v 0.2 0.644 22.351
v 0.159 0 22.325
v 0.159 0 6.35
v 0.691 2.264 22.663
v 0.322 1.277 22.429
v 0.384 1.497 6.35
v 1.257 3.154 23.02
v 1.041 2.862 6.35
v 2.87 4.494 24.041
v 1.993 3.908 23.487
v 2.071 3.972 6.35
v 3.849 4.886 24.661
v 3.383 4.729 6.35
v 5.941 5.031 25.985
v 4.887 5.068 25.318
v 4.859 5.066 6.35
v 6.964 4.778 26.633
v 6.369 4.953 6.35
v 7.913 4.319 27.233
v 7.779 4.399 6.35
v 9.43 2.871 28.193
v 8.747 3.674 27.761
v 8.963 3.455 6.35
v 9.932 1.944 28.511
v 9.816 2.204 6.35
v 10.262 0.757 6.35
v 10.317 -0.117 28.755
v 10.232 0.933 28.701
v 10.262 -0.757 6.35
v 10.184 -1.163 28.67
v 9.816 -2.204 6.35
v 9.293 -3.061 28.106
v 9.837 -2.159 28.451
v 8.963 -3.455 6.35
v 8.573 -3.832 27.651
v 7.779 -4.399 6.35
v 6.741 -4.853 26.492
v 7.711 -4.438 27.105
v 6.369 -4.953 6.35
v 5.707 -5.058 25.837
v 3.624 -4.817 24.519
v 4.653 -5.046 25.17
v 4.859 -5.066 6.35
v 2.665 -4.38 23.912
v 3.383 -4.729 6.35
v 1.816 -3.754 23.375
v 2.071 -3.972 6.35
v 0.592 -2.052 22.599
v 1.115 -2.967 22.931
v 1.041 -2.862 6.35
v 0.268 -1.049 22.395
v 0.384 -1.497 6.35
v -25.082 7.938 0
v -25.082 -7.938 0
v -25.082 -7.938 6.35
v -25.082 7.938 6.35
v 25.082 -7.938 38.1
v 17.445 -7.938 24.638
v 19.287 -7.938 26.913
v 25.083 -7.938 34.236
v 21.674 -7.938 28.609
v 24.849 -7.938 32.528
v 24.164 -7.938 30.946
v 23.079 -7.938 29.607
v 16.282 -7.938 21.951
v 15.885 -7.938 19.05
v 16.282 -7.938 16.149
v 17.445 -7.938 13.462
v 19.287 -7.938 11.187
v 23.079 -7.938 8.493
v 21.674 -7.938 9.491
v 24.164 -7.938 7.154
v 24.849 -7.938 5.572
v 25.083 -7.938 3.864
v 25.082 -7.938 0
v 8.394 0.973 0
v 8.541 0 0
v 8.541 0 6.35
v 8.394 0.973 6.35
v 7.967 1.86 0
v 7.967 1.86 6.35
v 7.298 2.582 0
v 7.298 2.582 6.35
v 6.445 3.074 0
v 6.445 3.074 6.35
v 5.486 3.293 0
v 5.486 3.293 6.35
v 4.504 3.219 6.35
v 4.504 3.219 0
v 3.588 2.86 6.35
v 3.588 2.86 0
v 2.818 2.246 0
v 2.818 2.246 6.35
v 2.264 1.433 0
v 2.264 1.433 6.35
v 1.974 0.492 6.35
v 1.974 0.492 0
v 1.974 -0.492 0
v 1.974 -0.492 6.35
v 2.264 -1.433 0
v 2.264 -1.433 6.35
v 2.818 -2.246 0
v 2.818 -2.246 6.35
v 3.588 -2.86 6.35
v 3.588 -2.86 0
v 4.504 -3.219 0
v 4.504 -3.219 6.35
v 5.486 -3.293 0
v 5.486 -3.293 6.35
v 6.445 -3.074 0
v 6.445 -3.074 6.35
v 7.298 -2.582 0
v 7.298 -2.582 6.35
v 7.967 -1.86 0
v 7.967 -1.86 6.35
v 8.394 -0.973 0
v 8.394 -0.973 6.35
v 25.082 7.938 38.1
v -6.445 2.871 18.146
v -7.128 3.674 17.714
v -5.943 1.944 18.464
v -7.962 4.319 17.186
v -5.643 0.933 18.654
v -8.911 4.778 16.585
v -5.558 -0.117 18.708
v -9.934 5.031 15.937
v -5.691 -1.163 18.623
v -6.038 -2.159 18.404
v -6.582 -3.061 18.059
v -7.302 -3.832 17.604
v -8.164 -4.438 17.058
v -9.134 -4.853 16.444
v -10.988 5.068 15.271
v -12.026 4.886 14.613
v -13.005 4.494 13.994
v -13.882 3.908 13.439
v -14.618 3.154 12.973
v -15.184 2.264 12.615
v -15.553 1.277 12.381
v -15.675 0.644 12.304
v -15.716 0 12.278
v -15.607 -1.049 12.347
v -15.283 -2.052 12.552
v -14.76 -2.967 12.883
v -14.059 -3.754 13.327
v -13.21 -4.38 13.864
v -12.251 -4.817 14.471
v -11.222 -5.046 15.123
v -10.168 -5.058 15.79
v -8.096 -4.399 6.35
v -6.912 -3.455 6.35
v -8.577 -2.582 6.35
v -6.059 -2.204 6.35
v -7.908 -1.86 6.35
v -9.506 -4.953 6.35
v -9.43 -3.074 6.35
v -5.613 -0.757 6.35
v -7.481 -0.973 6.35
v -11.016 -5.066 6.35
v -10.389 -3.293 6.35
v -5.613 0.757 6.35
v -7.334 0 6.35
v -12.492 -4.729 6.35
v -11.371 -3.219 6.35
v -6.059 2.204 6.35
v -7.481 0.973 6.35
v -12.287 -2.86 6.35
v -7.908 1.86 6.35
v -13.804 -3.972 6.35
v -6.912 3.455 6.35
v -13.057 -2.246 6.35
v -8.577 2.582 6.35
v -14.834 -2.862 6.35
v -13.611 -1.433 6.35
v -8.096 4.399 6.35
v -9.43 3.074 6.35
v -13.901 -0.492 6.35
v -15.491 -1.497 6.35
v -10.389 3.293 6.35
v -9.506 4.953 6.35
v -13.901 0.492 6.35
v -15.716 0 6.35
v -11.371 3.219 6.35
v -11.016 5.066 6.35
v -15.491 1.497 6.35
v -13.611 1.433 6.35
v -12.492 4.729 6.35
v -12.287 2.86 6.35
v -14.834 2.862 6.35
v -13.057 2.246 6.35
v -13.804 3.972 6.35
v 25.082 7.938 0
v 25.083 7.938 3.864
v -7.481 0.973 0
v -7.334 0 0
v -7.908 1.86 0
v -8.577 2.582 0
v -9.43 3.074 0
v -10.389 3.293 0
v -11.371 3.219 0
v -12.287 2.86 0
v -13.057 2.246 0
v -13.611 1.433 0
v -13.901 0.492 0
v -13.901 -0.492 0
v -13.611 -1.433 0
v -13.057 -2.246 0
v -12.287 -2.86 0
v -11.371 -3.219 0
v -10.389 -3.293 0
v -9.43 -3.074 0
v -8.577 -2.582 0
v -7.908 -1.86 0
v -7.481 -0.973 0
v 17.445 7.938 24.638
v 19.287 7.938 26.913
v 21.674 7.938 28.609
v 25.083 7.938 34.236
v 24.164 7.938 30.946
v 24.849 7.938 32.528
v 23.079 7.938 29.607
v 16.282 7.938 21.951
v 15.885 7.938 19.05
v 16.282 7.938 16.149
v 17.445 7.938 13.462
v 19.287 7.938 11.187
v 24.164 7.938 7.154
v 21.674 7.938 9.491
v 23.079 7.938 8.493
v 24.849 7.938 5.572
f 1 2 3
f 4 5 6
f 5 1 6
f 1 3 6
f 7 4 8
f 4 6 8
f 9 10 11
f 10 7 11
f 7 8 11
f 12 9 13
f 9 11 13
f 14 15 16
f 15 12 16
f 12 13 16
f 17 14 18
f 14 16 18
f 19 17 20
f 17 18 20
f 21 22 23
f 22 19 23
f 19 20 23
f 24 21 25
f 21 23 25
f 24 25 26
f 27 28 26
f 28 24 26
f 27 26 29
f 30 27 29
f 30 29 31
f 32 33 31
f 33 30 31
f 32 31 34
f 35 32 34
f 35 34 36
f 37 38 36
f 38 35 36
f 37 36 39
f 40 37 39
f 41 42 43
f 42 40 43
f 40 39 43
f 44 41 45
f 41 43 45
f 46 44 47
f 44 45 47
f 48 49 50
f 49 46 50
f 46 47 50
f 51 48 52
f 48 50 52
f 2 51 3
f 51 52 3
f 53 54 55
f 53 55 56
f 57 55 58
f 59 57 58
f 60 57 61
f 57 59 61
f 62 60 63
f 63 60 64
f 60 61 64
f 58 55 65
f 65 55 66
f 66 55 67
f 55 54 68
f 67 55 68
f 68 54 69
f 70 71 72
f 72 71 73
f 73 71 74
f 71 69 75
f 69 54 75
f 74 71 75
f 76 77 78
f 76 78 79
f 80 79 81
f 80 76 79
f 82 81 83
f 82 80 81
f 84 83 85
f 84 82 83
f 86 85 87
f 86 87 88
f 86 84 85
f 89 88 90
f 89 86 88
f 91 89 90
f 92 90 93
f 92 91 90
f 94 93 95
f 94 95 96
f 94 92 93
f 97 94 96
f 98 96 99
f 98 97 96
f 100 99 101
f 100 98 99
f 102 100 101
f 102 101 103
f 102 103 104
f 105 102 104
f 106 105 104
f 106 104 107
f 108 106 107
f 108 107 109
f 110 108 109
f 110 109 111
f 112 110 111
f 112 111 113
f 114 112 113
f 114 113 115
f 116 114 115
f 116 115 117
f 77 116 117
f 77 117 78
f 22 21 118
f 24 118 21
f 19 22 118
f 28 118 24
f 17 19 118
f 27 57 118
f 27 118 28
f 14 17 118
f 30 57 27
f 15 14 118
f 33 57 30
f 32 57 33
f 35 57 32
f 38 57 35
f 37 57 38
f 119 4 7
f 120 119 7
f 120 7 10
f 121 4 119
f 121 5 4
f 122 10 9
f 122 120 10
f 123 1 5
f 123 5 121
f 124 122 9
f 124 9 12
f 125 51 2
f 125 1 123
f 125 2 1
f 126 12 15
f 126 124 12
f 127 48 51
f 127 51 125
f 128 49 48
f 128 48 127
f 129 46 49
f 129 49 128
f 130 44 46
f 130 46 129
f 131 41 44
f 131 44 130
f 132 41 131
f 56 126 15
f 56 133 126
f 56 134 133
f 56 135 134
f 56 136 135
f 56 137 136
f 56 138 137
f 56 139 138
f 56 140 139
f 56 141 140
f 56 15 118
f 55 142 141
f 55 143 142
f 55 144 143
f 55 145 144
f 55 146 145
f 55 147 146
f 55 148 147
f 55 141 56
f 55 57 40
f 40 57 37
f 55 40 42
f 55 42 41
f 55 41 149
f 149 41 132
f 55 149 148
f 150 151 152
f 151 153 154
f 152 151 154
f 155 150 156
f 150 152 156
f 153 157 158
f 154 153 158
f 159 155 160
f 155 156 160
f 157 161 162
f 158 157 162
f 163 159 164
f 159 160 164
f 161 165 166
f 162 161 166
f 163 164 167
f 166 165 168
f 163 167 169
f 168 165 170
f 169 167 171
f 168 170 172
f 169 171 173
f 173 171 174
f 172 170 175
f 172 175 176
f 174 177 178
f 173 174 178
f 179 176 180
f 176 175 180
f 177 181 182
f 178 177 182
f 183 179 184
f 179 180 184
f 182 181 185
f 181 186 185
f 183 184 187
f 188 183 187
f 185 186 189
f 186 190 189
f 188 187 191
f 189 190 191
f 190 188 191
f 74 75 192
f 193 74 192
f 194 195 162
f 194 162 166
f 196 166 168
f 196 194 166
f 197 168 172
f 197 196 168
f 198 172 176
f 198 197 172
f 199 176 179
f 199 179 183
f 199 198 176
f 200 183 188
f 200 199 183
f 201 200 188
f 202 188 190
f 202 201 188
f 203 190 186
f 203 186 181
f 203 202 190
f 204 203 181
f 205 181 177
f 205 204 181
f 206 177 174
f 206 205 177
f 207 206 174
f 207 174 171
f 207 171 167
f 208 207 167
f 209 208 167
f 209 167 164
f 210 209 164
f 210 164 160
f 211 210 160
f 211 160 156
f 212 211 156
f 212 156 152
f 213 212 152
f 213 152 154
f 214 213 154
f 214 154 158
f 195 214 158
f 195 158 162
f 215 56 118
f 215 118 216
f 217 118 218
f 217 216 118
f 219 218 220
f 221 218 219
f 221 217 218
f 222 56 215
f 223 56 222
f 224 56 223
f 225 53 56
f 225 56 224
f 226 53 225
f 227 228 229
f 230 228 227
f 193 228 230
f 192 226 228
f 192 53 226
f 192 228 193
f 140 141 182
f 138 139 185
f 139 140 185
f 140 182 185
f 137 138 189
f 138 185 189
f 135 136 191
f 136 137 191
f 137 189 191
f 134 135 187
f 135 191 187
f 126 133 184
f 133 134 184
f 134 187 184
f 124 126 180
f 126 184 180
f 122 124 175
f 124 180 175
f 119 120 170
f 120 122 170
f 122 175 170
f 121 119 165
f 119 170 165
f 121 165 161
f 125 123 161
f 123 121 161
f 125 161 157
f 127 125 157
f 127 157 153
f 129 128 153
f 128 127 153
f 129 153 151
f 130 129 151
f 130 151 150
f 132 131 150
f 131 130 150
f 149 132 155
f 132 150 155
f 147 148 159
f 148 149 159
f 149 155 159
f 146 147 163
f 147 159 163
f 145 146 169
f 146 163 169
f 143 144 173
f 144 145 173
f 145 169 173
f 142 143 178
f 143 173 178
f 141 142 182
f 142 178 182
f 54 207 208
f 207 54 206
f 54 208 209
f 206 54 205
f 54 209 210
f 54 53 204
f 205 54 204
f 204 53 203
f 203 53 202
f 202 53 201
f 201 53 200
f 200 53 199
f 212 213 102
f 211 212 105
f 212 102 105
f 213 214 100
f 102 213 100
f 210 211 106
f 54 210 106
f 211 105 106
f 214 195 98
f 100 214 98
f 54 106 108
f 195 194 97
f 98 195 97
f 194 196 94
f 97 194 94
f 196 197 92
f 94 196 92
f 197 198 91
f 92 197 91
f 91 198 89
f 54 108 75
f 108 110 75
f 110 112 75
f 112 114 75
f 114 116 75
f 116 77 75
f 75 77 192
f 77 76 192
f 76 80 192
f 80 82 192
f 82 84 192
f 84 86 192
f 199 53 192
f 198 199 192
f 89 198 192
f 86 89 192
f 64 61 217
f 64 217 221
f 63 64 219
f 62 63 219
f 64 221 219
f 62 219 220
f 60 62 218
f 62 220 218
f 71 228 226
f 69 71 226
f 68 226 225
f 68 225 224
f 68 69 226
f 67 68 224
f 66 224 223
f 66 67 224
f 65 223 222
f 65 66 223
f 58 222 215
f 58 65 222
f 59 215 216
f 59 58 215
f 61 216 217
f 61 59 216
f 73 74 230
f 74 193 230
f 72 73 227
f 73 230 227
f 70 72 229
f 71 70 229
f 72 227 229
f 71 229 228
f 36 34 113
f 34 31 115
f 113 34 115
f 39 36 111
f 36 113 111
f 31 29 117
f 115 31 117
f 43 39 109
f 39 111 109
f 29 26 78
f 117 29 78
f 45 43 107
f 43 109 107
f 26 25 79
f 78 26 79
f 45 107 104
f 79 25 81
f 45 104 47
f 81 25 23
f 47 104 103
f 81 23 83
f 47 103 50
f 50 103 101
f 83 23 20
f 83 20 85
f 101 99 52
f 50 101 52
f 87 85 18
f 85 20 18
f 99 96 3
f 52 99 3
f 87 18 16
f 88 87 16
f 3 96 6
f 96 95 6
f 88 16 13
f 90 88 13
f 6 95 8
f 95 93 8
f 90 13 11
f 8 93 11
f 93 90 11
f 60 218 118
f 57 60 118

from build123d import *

# Parameters (mm, degrees)
SKETCH1_W           = 50.165
SKETCH1_H           = 15.875
SKETCH1_R           = 3.302
BOSS_EXTRUDE1_DEPTH = 6.35
BOSS_EXTRUDE2_DEPTH = 15.875
FILLET1_R           = 6.35
SKETCH1_3_R         = 3.302
CUT_EXTRUDE1_DEPTH  = 47.300601643
SKETCH10_R          = 5.08
CUT_EXTRUDE4_DEPTH  = 42.233459866


with BuildPart() as part:
    # Sketch1 → Boss-Extrude1 (new body)
    with BuildSketch(Plane.XY):
        Rectangle(SKETCH1_W, SKETCH1_H)
        with Locations((5.23875, 0)):
            Circle(SKETCH1_R, mode=Mode.SUBTRACT)
        with Locations((-10.63625, 0)):
            Circle(SKETCH1_R, mode=Mode.SUBTRACT)
    extrude(amount=BOSS_EXTRUDE1_DEPTH)

    # Sketch4 → Boss-Extrude2 (add, through all)
    with BuildSketch(Plane.XZ.offset(7.9375)):
        with BuildLine():
            Line((-25.0825, 6.35), (25.0825, 6.35))
            Line((25.0825, 6.35), (25.0825, 8.382))
            ThreePointArc((25.0825, 8.382), (15.884529206, 19.05), (25.0825, 29.718))
            Line((25.0825, 29.718), (25.0825, 38.1))
            Line((25.0825, 38.1), (-25.0825, 6.35))
        make_face()
    extrude(amount=-BOSS_EXTRUDE2_DEPTH)

    # Fillet1
    fillet1_edges = [part.edges().sort_by_distance(p)[0] for p in [
        (25.0825, 0, 8.382),
        (25.0825, 0, 29.718),
    ]]
    fillet(fillet1_edges, radius=FILLET1_R)

    # Sketch1<3> → Cut-Extrude1 (cut, through all)
    with BuildSketch(Plane.XY):
        with Locations(Location((5.23875, 0, 0), (0, 0, 180))):
            Circle(SKETCH1_3_R)
        with Locations(Location((-10.63625, 0, 0), (0, 0, 180))):
            Circle(SKETCH1_3_R)
    extrude(amount=CUT_EXTRUDE1_DEPTH, mode=Mode.SUBTRACT)

    # Sketch10 → Cut-Extrude4 (cut, through all)
    with BuildSketch(Plane(origin=(0, 0, 6.35), x_dir=(-1, 0, 0), z_dir=(0, 0, -1))):
        with Locations((10.63625, 0)):
            Circle(SKETCH10_R)
        with Locations((-5.23875, 0)):
            Circle(SKETCH10_R)
    extrude(amount=-CUT_EXTRUDE4_DEPTH, mode=Mode.SUBTRACT)


solid = part.part
